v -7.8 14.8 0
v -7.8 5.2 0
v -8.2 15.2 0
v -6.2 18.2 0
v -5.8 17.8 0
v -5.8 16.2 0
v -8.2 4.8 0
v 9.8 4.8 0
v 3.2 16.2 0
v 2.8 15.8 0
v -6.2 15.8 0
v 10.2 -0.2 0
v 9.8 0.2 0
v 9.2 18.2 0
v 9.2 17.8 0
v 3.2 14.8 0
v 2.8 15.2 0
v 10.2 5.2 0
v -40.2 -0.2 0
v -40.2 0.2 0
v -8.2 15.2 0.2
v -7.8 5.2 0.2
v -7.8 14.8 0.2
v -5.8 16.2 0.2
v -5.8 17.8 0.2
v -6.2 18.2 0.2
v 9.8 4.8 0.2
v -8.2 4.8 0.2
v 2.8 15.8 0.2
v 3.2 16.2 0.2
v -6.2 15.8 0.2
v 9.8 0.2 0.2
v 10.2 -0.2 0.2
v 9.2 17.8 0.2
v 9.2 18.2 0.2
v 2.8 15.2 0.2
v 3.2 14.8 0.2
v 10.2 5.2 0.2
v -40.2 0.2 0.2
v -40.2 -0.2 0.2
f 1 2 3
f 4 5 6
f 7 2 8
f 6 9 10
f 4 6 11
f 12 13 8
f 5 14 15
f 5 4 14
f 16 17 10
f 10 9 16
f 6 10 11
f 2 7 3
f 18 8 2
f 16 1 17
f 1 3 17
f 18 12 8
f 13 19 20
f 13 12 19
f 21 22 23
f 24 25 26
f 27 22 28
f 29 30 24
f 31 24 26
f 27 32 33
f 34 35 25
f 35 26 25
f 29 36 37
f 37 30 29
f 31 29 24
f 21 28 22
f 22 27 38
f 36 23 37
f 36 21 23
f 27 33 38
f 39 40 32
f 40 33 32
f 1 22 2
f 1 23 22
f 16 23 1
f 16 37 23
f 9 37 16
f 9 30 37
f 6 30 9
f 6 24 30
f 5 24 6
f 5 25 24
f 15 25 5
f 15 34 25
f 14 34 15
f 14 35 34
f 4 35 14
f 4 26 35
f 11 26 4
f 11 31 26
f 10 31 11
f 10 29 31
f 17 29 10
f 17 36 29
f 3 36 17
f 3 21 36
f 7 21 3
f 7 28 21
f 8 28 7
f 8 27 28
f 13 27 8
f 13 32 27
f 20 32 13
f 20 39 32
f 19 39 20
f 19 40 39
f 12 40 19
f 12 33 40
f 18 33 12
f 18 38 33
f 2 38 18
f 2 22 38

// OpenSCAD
//////////////////////////////////////////////////////////////////////
// LibFile: first-layer-0u2Z-variable-50x18-v1.scad
// Project: Grid Stack
// FileGroup: Saved Object Recipe
// FileSummary: Permanent PLA+ first-layer recipe with five parallel traces,
//              independently configured lengths, and 5/10/1/2 mm repeats.
// Role: Demonstrates a path that is parallel and square-terminated without
//       being equally spaced, equal length, balanced, or symmetrical.
// Requires: Grid Stack API version 1 and first-layer schema version 1.
// Output: One printable 0.4 mm wide by 0.2 mm high continuous trace layer.
//////////////////////////////////////////////////////////////////////

include <../api/grid_stack_v1.scad>

assert(GRID_STACK_API_VERSION == 1,
    "This recipe requires Grid Stack API version 1.");
assert(GRID_STACK_FIRST_LAYER_SCHEMA_VERSION == 1,
    "This recipe requires Grid Stack first-layer schema version 1.");

saved_material = material_spec(
    name = "PLA_PLUS",
    family = "PLA+",
    flexibility = "rigid",
    status = "in_use",
    notes = "Exact material family used by this saved object."
);

saved_nozzle = nozzle_spec(
    name = "BRASS_0P4",
    diameter = 0.4,
    construction = "brass",
    status = "in_use",
    notes = "Exact nozzle hardware used by this saved object."
);

saved_process = process_profile(
    name = "PLA_PLUS_0P4_LH0P2_W2_H2_R1",
    material_name = "PLA_PLUS",
    nozzle_name = "BRASS_0P4",
    layer_height = 0.2,
    width_passes = 2,
    height_passes = 2,
    bridge_max = 6.0,
    qualification = "owner_tested",
    revision = 1,
    notes = "This object intentionally uses one primitive trace, not the composed strand."
);

saved_traces = [
    [-10, 10,  0],
    [ -8, 10,  5],
    [ -8,  3, 15],
    [ -6,  3, 16],
    [ -6,  9, 18]
];

saved_first_layer = first_layer_object(
    name = "FIRST_LAYER_0U2Z_VARIABLE_50X18_V1",
    revision = 1,
    required_api_version = 1,
    first_layer_schema_version = 1,
    source_release = "0.6.0",
    material = saved_material,
    nozzle = saved_nozzle,
    process = saved_process,
    traces = saved_traces,
    orientation = 0,
    lead_in = 30,
    status = "calibration",
    notes = "Create V2 rather than editing this recipe after printing."
);

first_layer_render(
    saved_first_layer,
    mode = "trace_layer",
    report_level = "full",
    show_path_point_numbers = false
);
